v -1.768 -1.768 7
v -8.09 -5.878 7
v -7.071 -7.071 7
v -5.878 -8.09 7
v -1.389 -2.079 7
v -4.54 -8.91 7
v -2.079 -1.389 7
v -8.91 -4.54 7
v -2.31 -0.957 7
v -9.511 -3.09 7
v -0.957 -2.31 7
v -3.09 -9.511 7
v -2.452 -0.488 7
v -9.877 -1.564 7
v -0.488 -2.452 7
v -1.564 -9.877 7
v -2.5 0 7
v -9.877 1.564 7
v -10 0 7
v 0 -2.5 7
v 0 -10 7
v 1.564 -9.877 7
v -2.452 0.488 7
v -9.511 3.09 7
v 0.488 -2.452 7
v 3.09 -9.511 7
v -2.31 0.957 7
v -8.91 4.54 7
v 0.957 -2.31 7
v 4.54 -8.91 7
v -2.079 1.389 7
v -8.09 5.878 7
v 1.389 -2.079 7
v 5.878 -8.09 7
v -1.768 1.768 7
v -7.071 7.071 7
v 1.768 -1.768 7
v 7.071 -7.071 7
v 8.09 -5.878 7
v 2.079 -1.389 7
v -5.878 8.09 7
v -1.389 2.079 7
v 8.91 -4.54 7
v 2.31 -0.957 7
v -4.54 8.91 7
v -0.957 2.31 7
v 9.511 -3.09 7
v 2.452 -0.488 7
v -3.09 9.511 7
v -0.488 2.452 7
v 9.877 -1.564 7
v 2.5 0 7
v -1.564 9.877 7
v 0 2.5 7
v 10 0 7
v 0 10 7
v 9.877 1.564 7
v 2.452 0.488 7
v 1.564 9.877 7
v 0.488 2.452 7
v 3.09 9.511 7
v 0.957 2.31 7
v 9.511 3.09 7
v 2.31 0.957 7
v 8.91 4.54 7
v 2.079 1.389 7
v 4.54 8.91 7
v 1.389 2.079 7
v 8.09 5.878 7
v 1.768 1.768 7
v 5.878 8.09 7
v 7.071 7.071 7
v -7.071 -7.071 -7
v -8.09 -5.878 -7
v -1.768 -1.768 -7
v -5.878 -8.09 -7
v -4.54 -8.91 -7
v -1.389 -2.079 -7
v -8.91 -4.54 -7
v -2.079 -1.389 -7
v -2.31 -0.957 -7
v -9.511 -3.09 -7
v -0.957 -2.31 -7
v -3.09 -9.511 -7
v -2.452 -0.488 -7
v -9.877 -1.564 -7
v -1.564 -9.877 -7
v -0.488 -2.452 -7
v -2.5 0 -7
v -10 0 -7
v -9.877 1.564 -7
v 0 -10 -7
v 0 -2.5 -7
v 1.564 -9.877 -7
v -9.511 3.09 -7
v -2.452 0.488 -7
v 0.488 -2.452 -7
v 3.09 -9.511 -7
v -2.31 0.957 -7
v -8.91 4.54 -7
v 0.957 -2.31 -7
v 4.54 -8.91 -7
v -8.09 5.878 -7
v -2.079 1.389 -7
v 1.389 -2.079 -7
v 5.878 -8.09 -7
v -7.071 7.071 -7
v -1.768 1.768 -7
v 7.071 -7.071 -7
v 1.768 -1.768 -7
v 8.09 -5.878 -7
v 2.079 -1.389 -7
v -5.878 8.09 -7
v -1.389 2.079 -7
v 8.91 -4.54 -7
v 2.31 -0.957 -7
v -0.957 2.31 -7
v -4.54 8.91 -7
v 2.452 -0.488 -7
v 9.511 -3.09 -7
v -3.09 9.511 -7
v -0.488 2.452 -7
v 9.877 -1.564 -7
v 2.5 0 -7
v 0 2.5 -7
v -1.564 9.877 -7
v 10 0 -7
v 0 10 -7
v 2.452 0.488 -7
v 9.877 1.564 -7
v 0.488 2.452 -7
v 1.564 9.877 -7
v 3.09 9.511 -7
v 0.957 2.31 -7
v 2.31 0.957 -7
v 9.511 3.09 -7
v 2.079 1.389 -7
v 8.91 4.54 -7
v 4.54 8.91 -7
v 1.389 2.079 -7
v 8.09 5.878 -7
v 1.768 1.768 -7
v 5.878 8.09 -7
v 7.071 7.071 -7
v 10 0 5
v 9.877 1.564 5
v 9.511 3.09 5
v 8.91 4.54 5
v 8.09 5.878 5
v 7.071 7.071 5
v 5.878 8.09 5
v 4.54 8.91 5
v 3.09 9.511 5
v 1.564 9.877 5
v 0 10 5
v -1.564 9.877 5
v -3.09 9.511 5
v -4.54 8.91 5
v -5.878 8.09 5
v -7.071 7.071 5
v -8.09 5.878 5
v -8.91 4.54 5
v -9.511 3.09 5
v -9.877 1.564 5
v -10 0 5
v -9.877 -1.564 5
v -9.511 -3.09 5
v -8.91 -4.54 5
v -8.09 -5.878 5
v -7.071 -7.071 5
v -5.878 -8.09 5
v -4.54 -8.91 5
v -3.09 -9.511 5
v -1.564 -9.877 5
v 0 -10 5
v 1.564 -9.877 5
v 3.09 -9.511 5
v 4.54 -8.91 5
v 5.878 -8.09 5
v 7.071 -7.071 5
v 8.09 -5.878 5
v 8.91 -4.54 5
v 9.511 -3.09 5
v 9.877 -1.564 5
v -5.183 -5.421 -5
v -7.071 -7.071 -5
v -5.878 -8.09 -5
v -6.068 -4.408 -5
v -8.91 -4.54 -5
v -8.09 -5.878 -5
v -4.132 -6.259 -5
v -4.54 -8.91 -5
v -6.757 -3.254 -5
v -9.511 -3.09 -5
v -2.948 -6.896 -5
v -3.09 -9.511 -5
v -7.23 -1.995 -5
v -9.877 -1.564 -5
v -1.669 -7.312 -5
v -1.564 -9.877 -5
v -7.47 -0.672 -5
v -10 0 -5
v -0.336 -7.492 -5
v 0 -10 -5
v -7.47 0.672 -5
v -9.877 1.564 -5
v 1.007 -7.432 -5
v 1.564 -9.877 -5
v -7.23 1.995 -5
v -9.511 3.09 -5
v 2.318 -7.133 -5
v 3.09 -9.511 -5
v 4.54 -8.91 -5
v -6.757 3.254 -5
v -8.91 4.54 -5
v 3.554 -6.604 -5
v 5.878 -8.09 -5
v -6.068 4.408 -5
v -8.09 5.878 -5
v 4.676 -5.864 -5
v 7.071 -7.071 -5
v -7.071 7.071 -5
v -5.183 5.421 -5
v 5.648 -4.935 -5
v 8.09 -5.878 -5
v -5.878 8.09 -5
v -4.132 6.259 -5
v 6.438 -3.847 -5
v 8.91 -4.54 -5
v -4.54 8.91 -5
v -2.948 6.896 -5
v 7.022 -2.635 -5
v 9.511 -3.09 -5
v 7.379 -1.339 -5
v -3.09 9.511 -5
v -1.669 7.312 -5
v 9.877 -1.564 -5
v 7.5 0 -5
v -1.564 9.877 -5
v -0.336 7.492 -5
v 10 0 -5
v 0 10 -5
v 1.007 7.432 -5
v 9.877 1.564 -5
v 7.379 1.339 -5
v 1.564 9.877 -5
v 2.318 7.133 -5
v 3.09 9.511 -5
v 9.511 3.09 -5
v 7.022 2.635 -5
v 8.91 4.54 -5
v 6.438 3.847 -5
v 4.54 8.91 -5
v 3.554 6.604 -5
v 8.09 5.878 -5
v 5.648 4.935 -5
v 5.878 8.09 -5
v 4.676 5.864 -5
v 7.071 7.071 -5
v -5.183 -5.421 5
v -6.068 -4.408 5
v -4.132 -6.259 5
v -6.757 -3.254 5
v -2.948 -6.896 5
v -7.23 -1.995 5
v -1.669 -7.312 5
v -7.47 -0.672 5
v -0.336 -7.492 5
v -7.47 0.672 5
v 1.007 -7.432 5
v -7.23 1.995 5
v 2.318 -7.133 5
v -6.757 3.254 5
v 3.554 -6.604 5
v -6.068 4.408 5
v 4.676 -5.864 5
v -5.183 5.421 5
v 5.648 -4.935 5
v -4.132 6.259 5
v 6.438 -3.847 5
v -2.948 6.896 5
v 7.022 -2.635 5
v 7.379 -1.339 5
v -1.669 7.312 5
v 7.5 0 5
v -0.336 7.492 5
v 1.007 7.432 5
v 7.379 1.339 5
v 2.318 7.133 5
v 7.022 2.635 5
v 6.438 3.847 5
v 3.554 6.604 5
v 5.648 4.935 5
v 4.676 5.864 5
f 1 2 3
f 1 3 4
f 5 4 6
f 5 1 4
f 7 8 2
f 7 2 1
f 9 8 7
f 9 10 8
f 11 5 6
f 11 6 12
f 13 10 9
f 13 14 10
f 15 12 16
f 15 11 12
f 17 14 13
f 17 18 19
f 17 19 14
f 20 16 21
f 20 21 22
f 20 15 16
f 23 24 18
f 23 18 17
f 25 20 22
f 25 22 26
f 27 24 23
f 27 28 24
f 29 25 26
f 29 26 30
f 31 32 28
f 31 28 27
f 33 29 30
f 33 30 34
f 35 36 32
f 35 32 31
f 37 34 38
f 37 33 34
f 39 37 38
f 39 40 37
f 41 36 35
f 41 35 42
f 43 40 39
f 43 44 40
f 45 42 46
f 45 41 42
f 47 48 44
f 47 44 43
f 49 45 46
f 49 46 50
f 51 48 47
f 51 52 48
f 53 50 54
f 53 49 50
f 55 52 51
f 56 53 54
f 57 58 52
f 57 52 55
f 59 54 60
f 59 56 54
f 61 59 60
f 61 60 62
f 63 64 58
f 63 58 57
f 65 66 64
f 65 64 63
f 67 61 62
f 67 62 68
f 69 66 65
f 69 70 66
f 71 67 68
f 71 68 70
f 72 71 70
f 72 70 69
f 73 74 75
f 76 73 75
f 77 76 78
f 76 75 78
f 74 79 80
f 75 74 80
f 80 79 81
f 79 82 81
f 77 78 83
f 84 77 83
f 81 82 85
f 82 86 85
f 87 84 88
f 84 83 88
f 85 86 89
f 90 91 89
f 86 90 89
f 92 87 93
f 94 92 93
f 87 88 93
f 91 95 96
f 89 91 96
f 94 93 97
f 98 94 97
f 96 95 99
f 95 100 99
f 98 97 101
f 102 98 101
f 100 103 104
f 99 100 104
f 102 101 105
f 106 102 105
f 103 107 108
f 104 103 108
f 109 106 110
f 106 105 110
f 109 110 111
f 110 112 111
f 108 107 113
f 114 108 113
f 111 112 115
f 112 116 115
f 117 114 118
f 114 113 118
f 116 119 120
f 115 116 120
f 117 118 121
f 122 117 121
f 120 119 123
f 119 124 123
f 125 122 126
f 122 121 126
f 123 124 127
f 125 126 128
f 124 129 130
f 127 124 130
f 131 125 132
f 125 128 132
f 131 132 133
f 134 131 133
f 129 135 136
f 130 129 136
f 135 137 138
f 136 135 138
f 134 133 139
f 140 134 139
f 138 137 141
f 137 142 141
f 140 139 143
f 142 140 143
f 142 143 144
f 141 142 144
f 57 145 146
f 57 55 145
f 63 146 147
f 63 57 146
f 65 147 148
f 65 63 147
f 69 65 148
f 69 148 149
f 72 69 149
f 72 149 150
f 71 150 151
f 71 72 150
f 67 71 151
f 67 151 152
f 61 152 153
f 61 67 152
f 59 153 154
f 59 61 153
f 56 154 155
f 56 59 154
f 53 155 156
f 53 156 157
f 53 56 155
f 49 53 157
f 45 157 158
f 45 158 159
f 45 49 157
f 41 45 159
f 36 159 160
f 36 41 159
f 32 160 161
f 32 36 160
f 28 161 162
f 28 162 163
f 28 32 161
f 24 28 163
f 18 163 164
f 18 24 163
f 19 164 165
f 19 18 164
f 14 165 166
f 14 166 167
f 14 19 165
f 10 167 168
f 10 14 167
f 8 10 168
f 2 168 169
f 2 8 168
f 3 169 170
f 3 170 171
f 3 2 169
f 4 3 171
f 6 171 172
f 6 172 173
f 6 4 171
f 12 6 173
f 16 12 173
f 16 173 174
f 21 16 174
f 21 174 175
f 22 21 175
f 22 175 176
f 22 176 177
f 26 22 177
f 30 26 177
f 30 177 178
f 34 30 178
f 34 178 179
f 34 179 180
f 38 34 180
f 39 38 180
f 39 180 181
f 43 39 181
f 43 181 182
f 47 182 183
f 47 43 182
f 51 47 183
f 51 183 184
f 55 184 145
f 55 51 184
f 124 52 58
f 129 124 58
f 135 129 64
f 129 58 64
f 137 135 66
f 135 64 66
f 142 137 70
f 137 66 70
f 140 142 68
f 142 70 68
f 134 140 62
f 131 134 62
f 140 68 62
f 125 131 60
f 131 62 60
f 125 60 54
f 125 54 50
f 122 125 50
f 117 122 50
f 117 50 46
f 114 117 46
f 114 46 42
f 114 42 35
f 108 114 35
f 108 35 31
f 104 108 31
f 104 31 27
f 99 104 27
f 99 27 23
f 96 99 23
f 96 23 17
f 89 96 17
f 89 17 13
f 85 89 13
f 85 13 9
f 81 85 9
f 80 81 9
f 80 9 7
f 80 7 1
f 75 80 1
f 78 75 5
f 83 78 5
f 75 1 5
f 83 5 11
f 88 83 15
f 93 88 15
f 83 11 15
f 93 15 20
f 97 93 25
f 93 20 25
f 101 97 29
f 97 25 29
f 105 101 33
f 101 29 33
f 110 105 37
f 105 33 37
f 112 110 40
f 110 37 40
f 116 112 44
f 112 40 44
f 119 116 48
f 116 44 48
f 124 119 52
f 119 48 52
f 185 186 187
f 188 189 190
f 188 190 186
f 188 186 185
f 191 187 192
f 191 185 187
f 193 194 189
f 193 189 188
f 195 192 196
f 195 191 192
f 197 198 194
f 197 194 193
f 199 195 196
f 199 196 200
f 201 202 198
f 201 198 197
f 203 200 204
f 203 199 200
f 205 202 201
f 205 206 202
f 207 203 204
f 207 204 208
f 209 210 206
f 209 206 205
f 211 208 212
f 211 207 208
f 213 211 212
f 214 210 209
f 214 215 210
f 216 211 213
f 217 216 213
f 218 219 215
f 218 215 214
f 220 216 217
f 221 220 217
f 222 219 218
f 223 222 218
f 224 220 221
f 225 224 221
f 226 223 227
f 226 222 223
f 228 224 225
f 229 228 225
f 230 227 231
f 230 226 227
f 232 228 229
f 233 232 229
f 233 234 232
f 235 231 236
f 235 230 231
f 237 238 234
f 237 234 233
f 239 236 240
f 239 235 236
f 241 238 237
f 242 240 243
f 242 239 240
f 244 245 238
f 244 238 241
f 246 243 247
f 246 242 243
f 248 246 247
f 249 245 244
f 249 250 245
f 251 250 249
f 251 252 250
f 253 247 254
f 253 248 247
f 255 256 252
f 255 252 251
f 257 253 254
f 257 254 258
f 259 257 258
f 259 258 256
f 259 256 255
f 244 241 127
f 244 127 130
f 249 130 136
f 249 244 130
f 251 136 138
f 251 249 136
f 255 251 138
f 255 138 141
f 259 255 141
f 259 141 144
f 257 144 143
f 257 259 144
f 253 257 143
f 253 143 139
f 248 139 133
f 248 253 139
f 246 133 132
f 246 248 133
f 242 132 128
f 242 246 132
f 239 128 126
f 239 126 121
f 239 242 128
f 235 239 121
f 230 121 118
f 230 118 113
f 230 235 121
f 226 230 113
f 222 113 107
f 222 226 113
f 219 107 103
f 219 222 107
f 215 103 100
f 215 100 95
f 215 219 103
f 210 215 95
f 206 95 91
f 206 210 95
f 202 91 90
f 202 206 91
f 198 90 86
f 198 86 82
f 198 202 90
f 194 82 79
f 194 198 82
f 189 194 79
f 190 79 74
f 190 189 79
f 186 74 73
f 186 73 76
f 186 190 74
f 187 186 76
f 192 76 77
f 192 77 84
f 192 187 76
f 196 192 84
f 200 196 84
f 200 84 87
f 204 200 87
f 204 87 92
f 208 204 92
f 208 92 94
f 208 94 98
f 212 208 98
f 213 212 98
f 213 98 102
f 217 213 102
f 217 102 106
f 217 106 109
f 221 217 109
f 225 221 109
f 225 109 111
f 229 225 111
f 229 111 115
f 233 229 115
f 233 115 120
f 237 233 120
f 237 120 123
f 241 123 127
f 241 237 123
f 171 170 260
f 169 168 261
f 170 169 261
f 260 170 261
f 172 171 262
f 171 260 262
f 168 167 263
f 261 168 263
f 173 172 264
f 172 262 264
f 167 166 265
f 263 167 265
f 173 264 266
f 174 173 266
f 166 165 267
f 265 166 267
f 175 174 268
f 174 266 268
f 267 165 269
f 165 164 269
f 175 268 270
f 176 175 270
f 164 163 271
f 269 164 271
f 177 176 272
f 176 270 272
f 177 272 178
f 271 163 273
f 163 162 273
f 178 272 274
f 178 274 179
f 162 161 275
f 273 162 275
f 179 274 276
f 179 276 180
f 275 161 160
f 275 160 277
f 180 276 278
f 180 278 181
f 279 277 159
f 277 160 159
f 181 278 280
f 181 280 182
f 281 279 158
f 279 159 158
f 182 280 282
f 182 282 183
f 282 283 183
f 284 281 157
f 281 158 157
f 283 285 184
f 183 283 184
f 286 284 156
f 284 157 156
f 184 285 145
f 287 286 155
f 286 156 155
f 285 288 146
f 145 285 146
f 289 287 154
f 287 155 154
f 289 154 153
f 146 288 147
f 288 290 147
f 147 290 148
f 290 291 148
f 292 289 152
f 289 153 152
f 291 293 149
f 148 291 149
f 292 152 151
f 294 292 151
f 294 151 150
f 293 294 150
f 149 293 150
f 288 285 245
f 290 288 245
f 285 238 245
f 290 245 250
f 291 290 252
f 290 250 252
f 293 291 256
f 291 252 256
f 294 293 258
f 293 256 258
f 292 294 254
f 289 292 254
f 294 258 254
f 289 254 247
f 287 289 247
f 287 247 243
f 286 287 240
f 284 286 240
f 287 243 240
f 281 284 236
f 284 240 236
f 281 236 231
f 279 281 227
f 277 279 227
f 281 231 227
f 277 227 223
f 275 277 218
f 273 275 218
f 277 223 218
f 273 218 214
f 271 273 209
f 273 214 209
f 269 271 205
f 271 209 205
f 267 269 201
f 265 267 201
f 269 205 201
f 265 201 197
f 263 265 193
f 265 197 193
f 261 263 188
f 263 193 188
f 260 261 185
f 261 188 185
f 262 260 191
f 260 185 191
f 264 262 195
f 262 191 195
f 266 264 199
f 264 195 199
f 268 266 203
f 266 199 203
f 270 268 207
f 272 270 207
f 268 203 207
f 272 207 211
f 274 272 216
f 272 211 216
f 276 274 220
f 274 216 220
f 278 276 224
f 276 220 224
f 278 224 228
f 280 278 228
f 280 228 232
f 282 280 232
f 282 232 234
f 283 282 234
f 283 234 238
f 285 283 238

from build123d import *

# Parameters (mm, degrees)
SKETCH1_R           = 10
BOSS_EXTRUDE1_DEPTH = 7
SKETCH2_R           = 10
SKETCH2_R_2         = 7.5
CUT_EXTRUDE2_DEPTH  = 5
CUT_EXTRUDE3_REACH  = 21.9
SKETCH3_R           = 2.5


with BuildPart() as part:
    # Sketch1 → Boss-Extrude1 (new, symmetric)
    with BuildSketch(Plane.XY):
        Circle(SKETCH1_R)
    extrude(amount=BOSS_EXTRUDE1_DEPTH, both=True)

    # Sketch2 → Cut-Extrude2 (cut, symmetric)
    with BuildSketch(Plane.XY):
        Circle(SKETCH2_R)
        Circle(SKETCH2_R_2, mode=Mode.SUBTRACT)
    extrude(amount=CUT_EXTRUDE2_DEPTH, both=True, mode=Mode.SUBTRACT)

    # Sketch3 → Cut-Extrude3 (cut, up to next)
    with BuildSketch(Plane.XY.offset(7), mode=Mode.PRIVATE) as cut_extrude3_sk1:
        Circle(SKETCH3_R)
    cut_extrude3_tool1 = extrude(cut_extrude3_sk1.sketch, amount=-CUT_EXTRUDE3_REACH, mode=Mode.PRIVATE) & part.part
    add(cut_extrude3_tool1.solids().sort_by_distance((0, 0, 7))[0], mode=Mode.SUBTRACT)


solid = part.part
